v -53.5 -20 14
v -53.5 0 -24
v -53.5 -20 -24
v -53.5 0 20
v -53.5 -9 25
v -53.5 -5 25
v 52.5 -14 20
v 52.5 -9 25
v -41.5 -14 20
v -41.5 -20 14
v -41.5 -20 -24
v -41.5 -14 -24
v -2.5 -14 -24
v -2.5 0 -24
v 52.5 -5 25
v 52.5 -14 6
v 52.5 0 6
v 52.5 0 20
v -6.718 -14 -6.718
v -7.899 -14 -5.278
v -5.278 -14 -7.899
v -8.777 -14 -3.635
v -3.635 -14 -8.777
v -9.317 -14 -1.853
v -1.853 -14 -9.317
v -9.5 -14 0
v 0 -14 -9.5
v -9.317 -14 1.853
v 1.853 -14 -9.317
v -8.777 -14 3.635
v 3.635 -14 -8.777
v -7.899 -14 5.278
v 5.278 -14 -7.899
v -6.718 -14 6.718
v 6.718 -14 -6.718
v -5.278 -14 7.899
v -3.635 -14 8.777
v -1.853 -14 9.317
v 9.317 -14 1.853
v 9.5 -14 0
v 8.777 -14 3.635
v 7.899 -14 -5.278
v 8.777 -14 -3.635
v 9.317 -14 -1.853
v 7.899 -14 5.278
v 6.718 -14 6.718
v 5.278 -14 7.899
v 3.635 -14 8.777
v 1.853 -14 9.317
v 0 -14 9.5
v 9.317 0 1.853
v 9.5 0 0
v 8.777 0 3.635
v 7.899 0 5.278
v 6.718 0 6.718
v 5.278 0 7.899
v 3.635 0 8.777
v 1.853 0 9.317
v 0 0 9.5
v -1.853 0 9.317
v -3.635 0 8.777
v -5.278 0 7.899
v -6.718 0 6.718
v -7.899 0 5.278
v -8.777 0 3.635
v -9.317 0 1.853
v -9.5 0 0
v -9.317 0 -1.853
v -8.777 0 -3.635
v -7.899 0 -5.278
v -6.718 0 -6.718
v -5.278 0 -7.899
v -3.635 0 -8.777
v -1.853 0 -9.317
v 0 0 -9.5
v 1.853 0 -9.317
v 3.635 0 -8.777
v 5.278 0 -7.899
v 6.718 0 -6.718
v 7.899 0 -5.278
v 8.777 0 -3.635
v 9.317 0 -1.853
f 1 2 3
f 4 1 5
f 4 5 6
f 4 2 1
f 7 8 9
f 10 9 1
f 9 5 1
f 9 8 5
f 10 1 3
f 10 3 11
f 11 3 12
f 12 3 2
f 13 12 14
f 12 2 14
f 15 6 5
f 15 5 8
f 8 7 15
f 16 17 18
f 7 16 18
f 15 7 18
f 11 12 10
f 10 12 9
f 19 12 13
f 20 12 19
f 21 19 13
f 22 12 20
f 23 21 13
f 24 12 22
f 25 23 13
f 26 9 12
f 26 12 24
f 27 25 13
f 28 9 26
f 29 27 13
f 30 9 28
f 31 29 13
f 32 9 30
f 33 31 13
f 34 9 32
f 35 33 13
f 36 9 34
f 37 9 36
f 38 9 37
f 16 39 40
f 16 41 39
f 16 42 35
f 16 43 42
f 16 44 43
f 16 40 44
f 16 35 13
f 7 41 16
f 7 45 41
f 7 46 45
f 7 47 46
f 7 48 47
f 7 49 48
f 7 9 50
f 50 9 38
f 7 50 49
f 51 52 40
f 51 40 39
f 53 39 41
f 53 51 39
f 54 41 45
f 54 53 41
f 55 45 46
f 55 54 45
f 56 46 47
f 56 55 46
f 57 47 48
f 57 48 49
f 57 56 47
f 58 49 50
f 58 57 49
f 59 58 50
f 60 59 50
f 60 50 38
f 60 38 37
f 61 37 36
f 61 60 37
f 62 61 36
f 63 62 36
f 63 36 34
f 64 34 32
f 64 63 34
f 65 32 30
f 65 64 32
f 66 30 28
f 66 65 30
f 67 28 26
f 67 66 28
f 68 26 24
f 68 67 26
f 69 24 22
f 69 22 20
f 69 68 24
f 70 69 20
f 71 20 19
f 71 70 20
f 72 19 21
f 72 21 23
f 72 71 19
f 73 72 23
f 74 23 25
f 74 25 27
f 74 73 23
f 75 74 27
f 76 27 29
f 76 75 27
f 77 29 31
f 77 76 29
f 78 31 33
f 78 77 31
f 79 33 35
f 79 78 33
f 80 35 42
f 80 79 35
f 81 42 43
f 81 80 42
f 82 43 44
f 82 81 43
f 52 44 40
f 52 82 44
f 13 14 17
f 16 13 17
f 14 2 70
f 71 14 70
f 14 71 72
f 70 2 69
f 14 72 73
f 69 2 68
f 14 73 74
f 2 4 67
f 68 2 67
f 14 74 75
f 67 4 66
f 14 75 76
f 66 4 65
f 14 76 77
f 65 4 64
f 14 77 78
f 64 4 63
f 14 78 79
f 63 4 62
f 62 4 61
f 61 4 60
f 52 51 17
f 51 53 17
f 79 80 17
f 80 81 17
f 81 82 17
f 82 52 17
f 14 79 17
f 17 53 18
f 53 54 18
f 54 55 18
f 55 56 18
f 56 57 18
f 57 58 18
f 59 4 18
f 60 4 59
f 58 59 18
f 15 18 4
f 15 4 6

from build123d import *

# Parameters (mm, degrees)
F0_R     = 9.5
F1_DEPTH = 14
F2_W     = 12
F2_H     = 49
F3_DEPTH = 6
F5_DEPTH = 106.001


with BuildPart() as f1:
    # F0 (on Front) → F1 (new body)
    with BuildSketch(Plane.XZ):
        Polygon((52.5, 25), (-53.5, 25), (-53.5, -24), (-2.5, -24), (52.5, 6), align=None)
        Circle(F0_R, mode=Mode.SUBTRACT)
    extrude(amount=F1_DEPTH)

    # F2 (on face) → F3 (join)
    with BuildSketch(Plane.XZ.offset(14)):
        with Locations((-47.5, 0.5)):
            Rectangle(F2_W, F2_H)
    extrude(amount=F3_DEPTH)

    # F4 (on face) → F5 (cut, through all)
    with BuildSketch(Plane(origin=(-53.5, 0, 0), x_dir=(0, -1, 0), z_dir=(-1, 0, 0))):
        Polygon((20, 25), (9, 25), (20, 14), align=None)
        Polygon((0, 25), (0, 20), (5, 25), align=None)
    extrude(amount=-F5_DEPTH, mode=Mode.SUBTRACT)


solid = f1.part
